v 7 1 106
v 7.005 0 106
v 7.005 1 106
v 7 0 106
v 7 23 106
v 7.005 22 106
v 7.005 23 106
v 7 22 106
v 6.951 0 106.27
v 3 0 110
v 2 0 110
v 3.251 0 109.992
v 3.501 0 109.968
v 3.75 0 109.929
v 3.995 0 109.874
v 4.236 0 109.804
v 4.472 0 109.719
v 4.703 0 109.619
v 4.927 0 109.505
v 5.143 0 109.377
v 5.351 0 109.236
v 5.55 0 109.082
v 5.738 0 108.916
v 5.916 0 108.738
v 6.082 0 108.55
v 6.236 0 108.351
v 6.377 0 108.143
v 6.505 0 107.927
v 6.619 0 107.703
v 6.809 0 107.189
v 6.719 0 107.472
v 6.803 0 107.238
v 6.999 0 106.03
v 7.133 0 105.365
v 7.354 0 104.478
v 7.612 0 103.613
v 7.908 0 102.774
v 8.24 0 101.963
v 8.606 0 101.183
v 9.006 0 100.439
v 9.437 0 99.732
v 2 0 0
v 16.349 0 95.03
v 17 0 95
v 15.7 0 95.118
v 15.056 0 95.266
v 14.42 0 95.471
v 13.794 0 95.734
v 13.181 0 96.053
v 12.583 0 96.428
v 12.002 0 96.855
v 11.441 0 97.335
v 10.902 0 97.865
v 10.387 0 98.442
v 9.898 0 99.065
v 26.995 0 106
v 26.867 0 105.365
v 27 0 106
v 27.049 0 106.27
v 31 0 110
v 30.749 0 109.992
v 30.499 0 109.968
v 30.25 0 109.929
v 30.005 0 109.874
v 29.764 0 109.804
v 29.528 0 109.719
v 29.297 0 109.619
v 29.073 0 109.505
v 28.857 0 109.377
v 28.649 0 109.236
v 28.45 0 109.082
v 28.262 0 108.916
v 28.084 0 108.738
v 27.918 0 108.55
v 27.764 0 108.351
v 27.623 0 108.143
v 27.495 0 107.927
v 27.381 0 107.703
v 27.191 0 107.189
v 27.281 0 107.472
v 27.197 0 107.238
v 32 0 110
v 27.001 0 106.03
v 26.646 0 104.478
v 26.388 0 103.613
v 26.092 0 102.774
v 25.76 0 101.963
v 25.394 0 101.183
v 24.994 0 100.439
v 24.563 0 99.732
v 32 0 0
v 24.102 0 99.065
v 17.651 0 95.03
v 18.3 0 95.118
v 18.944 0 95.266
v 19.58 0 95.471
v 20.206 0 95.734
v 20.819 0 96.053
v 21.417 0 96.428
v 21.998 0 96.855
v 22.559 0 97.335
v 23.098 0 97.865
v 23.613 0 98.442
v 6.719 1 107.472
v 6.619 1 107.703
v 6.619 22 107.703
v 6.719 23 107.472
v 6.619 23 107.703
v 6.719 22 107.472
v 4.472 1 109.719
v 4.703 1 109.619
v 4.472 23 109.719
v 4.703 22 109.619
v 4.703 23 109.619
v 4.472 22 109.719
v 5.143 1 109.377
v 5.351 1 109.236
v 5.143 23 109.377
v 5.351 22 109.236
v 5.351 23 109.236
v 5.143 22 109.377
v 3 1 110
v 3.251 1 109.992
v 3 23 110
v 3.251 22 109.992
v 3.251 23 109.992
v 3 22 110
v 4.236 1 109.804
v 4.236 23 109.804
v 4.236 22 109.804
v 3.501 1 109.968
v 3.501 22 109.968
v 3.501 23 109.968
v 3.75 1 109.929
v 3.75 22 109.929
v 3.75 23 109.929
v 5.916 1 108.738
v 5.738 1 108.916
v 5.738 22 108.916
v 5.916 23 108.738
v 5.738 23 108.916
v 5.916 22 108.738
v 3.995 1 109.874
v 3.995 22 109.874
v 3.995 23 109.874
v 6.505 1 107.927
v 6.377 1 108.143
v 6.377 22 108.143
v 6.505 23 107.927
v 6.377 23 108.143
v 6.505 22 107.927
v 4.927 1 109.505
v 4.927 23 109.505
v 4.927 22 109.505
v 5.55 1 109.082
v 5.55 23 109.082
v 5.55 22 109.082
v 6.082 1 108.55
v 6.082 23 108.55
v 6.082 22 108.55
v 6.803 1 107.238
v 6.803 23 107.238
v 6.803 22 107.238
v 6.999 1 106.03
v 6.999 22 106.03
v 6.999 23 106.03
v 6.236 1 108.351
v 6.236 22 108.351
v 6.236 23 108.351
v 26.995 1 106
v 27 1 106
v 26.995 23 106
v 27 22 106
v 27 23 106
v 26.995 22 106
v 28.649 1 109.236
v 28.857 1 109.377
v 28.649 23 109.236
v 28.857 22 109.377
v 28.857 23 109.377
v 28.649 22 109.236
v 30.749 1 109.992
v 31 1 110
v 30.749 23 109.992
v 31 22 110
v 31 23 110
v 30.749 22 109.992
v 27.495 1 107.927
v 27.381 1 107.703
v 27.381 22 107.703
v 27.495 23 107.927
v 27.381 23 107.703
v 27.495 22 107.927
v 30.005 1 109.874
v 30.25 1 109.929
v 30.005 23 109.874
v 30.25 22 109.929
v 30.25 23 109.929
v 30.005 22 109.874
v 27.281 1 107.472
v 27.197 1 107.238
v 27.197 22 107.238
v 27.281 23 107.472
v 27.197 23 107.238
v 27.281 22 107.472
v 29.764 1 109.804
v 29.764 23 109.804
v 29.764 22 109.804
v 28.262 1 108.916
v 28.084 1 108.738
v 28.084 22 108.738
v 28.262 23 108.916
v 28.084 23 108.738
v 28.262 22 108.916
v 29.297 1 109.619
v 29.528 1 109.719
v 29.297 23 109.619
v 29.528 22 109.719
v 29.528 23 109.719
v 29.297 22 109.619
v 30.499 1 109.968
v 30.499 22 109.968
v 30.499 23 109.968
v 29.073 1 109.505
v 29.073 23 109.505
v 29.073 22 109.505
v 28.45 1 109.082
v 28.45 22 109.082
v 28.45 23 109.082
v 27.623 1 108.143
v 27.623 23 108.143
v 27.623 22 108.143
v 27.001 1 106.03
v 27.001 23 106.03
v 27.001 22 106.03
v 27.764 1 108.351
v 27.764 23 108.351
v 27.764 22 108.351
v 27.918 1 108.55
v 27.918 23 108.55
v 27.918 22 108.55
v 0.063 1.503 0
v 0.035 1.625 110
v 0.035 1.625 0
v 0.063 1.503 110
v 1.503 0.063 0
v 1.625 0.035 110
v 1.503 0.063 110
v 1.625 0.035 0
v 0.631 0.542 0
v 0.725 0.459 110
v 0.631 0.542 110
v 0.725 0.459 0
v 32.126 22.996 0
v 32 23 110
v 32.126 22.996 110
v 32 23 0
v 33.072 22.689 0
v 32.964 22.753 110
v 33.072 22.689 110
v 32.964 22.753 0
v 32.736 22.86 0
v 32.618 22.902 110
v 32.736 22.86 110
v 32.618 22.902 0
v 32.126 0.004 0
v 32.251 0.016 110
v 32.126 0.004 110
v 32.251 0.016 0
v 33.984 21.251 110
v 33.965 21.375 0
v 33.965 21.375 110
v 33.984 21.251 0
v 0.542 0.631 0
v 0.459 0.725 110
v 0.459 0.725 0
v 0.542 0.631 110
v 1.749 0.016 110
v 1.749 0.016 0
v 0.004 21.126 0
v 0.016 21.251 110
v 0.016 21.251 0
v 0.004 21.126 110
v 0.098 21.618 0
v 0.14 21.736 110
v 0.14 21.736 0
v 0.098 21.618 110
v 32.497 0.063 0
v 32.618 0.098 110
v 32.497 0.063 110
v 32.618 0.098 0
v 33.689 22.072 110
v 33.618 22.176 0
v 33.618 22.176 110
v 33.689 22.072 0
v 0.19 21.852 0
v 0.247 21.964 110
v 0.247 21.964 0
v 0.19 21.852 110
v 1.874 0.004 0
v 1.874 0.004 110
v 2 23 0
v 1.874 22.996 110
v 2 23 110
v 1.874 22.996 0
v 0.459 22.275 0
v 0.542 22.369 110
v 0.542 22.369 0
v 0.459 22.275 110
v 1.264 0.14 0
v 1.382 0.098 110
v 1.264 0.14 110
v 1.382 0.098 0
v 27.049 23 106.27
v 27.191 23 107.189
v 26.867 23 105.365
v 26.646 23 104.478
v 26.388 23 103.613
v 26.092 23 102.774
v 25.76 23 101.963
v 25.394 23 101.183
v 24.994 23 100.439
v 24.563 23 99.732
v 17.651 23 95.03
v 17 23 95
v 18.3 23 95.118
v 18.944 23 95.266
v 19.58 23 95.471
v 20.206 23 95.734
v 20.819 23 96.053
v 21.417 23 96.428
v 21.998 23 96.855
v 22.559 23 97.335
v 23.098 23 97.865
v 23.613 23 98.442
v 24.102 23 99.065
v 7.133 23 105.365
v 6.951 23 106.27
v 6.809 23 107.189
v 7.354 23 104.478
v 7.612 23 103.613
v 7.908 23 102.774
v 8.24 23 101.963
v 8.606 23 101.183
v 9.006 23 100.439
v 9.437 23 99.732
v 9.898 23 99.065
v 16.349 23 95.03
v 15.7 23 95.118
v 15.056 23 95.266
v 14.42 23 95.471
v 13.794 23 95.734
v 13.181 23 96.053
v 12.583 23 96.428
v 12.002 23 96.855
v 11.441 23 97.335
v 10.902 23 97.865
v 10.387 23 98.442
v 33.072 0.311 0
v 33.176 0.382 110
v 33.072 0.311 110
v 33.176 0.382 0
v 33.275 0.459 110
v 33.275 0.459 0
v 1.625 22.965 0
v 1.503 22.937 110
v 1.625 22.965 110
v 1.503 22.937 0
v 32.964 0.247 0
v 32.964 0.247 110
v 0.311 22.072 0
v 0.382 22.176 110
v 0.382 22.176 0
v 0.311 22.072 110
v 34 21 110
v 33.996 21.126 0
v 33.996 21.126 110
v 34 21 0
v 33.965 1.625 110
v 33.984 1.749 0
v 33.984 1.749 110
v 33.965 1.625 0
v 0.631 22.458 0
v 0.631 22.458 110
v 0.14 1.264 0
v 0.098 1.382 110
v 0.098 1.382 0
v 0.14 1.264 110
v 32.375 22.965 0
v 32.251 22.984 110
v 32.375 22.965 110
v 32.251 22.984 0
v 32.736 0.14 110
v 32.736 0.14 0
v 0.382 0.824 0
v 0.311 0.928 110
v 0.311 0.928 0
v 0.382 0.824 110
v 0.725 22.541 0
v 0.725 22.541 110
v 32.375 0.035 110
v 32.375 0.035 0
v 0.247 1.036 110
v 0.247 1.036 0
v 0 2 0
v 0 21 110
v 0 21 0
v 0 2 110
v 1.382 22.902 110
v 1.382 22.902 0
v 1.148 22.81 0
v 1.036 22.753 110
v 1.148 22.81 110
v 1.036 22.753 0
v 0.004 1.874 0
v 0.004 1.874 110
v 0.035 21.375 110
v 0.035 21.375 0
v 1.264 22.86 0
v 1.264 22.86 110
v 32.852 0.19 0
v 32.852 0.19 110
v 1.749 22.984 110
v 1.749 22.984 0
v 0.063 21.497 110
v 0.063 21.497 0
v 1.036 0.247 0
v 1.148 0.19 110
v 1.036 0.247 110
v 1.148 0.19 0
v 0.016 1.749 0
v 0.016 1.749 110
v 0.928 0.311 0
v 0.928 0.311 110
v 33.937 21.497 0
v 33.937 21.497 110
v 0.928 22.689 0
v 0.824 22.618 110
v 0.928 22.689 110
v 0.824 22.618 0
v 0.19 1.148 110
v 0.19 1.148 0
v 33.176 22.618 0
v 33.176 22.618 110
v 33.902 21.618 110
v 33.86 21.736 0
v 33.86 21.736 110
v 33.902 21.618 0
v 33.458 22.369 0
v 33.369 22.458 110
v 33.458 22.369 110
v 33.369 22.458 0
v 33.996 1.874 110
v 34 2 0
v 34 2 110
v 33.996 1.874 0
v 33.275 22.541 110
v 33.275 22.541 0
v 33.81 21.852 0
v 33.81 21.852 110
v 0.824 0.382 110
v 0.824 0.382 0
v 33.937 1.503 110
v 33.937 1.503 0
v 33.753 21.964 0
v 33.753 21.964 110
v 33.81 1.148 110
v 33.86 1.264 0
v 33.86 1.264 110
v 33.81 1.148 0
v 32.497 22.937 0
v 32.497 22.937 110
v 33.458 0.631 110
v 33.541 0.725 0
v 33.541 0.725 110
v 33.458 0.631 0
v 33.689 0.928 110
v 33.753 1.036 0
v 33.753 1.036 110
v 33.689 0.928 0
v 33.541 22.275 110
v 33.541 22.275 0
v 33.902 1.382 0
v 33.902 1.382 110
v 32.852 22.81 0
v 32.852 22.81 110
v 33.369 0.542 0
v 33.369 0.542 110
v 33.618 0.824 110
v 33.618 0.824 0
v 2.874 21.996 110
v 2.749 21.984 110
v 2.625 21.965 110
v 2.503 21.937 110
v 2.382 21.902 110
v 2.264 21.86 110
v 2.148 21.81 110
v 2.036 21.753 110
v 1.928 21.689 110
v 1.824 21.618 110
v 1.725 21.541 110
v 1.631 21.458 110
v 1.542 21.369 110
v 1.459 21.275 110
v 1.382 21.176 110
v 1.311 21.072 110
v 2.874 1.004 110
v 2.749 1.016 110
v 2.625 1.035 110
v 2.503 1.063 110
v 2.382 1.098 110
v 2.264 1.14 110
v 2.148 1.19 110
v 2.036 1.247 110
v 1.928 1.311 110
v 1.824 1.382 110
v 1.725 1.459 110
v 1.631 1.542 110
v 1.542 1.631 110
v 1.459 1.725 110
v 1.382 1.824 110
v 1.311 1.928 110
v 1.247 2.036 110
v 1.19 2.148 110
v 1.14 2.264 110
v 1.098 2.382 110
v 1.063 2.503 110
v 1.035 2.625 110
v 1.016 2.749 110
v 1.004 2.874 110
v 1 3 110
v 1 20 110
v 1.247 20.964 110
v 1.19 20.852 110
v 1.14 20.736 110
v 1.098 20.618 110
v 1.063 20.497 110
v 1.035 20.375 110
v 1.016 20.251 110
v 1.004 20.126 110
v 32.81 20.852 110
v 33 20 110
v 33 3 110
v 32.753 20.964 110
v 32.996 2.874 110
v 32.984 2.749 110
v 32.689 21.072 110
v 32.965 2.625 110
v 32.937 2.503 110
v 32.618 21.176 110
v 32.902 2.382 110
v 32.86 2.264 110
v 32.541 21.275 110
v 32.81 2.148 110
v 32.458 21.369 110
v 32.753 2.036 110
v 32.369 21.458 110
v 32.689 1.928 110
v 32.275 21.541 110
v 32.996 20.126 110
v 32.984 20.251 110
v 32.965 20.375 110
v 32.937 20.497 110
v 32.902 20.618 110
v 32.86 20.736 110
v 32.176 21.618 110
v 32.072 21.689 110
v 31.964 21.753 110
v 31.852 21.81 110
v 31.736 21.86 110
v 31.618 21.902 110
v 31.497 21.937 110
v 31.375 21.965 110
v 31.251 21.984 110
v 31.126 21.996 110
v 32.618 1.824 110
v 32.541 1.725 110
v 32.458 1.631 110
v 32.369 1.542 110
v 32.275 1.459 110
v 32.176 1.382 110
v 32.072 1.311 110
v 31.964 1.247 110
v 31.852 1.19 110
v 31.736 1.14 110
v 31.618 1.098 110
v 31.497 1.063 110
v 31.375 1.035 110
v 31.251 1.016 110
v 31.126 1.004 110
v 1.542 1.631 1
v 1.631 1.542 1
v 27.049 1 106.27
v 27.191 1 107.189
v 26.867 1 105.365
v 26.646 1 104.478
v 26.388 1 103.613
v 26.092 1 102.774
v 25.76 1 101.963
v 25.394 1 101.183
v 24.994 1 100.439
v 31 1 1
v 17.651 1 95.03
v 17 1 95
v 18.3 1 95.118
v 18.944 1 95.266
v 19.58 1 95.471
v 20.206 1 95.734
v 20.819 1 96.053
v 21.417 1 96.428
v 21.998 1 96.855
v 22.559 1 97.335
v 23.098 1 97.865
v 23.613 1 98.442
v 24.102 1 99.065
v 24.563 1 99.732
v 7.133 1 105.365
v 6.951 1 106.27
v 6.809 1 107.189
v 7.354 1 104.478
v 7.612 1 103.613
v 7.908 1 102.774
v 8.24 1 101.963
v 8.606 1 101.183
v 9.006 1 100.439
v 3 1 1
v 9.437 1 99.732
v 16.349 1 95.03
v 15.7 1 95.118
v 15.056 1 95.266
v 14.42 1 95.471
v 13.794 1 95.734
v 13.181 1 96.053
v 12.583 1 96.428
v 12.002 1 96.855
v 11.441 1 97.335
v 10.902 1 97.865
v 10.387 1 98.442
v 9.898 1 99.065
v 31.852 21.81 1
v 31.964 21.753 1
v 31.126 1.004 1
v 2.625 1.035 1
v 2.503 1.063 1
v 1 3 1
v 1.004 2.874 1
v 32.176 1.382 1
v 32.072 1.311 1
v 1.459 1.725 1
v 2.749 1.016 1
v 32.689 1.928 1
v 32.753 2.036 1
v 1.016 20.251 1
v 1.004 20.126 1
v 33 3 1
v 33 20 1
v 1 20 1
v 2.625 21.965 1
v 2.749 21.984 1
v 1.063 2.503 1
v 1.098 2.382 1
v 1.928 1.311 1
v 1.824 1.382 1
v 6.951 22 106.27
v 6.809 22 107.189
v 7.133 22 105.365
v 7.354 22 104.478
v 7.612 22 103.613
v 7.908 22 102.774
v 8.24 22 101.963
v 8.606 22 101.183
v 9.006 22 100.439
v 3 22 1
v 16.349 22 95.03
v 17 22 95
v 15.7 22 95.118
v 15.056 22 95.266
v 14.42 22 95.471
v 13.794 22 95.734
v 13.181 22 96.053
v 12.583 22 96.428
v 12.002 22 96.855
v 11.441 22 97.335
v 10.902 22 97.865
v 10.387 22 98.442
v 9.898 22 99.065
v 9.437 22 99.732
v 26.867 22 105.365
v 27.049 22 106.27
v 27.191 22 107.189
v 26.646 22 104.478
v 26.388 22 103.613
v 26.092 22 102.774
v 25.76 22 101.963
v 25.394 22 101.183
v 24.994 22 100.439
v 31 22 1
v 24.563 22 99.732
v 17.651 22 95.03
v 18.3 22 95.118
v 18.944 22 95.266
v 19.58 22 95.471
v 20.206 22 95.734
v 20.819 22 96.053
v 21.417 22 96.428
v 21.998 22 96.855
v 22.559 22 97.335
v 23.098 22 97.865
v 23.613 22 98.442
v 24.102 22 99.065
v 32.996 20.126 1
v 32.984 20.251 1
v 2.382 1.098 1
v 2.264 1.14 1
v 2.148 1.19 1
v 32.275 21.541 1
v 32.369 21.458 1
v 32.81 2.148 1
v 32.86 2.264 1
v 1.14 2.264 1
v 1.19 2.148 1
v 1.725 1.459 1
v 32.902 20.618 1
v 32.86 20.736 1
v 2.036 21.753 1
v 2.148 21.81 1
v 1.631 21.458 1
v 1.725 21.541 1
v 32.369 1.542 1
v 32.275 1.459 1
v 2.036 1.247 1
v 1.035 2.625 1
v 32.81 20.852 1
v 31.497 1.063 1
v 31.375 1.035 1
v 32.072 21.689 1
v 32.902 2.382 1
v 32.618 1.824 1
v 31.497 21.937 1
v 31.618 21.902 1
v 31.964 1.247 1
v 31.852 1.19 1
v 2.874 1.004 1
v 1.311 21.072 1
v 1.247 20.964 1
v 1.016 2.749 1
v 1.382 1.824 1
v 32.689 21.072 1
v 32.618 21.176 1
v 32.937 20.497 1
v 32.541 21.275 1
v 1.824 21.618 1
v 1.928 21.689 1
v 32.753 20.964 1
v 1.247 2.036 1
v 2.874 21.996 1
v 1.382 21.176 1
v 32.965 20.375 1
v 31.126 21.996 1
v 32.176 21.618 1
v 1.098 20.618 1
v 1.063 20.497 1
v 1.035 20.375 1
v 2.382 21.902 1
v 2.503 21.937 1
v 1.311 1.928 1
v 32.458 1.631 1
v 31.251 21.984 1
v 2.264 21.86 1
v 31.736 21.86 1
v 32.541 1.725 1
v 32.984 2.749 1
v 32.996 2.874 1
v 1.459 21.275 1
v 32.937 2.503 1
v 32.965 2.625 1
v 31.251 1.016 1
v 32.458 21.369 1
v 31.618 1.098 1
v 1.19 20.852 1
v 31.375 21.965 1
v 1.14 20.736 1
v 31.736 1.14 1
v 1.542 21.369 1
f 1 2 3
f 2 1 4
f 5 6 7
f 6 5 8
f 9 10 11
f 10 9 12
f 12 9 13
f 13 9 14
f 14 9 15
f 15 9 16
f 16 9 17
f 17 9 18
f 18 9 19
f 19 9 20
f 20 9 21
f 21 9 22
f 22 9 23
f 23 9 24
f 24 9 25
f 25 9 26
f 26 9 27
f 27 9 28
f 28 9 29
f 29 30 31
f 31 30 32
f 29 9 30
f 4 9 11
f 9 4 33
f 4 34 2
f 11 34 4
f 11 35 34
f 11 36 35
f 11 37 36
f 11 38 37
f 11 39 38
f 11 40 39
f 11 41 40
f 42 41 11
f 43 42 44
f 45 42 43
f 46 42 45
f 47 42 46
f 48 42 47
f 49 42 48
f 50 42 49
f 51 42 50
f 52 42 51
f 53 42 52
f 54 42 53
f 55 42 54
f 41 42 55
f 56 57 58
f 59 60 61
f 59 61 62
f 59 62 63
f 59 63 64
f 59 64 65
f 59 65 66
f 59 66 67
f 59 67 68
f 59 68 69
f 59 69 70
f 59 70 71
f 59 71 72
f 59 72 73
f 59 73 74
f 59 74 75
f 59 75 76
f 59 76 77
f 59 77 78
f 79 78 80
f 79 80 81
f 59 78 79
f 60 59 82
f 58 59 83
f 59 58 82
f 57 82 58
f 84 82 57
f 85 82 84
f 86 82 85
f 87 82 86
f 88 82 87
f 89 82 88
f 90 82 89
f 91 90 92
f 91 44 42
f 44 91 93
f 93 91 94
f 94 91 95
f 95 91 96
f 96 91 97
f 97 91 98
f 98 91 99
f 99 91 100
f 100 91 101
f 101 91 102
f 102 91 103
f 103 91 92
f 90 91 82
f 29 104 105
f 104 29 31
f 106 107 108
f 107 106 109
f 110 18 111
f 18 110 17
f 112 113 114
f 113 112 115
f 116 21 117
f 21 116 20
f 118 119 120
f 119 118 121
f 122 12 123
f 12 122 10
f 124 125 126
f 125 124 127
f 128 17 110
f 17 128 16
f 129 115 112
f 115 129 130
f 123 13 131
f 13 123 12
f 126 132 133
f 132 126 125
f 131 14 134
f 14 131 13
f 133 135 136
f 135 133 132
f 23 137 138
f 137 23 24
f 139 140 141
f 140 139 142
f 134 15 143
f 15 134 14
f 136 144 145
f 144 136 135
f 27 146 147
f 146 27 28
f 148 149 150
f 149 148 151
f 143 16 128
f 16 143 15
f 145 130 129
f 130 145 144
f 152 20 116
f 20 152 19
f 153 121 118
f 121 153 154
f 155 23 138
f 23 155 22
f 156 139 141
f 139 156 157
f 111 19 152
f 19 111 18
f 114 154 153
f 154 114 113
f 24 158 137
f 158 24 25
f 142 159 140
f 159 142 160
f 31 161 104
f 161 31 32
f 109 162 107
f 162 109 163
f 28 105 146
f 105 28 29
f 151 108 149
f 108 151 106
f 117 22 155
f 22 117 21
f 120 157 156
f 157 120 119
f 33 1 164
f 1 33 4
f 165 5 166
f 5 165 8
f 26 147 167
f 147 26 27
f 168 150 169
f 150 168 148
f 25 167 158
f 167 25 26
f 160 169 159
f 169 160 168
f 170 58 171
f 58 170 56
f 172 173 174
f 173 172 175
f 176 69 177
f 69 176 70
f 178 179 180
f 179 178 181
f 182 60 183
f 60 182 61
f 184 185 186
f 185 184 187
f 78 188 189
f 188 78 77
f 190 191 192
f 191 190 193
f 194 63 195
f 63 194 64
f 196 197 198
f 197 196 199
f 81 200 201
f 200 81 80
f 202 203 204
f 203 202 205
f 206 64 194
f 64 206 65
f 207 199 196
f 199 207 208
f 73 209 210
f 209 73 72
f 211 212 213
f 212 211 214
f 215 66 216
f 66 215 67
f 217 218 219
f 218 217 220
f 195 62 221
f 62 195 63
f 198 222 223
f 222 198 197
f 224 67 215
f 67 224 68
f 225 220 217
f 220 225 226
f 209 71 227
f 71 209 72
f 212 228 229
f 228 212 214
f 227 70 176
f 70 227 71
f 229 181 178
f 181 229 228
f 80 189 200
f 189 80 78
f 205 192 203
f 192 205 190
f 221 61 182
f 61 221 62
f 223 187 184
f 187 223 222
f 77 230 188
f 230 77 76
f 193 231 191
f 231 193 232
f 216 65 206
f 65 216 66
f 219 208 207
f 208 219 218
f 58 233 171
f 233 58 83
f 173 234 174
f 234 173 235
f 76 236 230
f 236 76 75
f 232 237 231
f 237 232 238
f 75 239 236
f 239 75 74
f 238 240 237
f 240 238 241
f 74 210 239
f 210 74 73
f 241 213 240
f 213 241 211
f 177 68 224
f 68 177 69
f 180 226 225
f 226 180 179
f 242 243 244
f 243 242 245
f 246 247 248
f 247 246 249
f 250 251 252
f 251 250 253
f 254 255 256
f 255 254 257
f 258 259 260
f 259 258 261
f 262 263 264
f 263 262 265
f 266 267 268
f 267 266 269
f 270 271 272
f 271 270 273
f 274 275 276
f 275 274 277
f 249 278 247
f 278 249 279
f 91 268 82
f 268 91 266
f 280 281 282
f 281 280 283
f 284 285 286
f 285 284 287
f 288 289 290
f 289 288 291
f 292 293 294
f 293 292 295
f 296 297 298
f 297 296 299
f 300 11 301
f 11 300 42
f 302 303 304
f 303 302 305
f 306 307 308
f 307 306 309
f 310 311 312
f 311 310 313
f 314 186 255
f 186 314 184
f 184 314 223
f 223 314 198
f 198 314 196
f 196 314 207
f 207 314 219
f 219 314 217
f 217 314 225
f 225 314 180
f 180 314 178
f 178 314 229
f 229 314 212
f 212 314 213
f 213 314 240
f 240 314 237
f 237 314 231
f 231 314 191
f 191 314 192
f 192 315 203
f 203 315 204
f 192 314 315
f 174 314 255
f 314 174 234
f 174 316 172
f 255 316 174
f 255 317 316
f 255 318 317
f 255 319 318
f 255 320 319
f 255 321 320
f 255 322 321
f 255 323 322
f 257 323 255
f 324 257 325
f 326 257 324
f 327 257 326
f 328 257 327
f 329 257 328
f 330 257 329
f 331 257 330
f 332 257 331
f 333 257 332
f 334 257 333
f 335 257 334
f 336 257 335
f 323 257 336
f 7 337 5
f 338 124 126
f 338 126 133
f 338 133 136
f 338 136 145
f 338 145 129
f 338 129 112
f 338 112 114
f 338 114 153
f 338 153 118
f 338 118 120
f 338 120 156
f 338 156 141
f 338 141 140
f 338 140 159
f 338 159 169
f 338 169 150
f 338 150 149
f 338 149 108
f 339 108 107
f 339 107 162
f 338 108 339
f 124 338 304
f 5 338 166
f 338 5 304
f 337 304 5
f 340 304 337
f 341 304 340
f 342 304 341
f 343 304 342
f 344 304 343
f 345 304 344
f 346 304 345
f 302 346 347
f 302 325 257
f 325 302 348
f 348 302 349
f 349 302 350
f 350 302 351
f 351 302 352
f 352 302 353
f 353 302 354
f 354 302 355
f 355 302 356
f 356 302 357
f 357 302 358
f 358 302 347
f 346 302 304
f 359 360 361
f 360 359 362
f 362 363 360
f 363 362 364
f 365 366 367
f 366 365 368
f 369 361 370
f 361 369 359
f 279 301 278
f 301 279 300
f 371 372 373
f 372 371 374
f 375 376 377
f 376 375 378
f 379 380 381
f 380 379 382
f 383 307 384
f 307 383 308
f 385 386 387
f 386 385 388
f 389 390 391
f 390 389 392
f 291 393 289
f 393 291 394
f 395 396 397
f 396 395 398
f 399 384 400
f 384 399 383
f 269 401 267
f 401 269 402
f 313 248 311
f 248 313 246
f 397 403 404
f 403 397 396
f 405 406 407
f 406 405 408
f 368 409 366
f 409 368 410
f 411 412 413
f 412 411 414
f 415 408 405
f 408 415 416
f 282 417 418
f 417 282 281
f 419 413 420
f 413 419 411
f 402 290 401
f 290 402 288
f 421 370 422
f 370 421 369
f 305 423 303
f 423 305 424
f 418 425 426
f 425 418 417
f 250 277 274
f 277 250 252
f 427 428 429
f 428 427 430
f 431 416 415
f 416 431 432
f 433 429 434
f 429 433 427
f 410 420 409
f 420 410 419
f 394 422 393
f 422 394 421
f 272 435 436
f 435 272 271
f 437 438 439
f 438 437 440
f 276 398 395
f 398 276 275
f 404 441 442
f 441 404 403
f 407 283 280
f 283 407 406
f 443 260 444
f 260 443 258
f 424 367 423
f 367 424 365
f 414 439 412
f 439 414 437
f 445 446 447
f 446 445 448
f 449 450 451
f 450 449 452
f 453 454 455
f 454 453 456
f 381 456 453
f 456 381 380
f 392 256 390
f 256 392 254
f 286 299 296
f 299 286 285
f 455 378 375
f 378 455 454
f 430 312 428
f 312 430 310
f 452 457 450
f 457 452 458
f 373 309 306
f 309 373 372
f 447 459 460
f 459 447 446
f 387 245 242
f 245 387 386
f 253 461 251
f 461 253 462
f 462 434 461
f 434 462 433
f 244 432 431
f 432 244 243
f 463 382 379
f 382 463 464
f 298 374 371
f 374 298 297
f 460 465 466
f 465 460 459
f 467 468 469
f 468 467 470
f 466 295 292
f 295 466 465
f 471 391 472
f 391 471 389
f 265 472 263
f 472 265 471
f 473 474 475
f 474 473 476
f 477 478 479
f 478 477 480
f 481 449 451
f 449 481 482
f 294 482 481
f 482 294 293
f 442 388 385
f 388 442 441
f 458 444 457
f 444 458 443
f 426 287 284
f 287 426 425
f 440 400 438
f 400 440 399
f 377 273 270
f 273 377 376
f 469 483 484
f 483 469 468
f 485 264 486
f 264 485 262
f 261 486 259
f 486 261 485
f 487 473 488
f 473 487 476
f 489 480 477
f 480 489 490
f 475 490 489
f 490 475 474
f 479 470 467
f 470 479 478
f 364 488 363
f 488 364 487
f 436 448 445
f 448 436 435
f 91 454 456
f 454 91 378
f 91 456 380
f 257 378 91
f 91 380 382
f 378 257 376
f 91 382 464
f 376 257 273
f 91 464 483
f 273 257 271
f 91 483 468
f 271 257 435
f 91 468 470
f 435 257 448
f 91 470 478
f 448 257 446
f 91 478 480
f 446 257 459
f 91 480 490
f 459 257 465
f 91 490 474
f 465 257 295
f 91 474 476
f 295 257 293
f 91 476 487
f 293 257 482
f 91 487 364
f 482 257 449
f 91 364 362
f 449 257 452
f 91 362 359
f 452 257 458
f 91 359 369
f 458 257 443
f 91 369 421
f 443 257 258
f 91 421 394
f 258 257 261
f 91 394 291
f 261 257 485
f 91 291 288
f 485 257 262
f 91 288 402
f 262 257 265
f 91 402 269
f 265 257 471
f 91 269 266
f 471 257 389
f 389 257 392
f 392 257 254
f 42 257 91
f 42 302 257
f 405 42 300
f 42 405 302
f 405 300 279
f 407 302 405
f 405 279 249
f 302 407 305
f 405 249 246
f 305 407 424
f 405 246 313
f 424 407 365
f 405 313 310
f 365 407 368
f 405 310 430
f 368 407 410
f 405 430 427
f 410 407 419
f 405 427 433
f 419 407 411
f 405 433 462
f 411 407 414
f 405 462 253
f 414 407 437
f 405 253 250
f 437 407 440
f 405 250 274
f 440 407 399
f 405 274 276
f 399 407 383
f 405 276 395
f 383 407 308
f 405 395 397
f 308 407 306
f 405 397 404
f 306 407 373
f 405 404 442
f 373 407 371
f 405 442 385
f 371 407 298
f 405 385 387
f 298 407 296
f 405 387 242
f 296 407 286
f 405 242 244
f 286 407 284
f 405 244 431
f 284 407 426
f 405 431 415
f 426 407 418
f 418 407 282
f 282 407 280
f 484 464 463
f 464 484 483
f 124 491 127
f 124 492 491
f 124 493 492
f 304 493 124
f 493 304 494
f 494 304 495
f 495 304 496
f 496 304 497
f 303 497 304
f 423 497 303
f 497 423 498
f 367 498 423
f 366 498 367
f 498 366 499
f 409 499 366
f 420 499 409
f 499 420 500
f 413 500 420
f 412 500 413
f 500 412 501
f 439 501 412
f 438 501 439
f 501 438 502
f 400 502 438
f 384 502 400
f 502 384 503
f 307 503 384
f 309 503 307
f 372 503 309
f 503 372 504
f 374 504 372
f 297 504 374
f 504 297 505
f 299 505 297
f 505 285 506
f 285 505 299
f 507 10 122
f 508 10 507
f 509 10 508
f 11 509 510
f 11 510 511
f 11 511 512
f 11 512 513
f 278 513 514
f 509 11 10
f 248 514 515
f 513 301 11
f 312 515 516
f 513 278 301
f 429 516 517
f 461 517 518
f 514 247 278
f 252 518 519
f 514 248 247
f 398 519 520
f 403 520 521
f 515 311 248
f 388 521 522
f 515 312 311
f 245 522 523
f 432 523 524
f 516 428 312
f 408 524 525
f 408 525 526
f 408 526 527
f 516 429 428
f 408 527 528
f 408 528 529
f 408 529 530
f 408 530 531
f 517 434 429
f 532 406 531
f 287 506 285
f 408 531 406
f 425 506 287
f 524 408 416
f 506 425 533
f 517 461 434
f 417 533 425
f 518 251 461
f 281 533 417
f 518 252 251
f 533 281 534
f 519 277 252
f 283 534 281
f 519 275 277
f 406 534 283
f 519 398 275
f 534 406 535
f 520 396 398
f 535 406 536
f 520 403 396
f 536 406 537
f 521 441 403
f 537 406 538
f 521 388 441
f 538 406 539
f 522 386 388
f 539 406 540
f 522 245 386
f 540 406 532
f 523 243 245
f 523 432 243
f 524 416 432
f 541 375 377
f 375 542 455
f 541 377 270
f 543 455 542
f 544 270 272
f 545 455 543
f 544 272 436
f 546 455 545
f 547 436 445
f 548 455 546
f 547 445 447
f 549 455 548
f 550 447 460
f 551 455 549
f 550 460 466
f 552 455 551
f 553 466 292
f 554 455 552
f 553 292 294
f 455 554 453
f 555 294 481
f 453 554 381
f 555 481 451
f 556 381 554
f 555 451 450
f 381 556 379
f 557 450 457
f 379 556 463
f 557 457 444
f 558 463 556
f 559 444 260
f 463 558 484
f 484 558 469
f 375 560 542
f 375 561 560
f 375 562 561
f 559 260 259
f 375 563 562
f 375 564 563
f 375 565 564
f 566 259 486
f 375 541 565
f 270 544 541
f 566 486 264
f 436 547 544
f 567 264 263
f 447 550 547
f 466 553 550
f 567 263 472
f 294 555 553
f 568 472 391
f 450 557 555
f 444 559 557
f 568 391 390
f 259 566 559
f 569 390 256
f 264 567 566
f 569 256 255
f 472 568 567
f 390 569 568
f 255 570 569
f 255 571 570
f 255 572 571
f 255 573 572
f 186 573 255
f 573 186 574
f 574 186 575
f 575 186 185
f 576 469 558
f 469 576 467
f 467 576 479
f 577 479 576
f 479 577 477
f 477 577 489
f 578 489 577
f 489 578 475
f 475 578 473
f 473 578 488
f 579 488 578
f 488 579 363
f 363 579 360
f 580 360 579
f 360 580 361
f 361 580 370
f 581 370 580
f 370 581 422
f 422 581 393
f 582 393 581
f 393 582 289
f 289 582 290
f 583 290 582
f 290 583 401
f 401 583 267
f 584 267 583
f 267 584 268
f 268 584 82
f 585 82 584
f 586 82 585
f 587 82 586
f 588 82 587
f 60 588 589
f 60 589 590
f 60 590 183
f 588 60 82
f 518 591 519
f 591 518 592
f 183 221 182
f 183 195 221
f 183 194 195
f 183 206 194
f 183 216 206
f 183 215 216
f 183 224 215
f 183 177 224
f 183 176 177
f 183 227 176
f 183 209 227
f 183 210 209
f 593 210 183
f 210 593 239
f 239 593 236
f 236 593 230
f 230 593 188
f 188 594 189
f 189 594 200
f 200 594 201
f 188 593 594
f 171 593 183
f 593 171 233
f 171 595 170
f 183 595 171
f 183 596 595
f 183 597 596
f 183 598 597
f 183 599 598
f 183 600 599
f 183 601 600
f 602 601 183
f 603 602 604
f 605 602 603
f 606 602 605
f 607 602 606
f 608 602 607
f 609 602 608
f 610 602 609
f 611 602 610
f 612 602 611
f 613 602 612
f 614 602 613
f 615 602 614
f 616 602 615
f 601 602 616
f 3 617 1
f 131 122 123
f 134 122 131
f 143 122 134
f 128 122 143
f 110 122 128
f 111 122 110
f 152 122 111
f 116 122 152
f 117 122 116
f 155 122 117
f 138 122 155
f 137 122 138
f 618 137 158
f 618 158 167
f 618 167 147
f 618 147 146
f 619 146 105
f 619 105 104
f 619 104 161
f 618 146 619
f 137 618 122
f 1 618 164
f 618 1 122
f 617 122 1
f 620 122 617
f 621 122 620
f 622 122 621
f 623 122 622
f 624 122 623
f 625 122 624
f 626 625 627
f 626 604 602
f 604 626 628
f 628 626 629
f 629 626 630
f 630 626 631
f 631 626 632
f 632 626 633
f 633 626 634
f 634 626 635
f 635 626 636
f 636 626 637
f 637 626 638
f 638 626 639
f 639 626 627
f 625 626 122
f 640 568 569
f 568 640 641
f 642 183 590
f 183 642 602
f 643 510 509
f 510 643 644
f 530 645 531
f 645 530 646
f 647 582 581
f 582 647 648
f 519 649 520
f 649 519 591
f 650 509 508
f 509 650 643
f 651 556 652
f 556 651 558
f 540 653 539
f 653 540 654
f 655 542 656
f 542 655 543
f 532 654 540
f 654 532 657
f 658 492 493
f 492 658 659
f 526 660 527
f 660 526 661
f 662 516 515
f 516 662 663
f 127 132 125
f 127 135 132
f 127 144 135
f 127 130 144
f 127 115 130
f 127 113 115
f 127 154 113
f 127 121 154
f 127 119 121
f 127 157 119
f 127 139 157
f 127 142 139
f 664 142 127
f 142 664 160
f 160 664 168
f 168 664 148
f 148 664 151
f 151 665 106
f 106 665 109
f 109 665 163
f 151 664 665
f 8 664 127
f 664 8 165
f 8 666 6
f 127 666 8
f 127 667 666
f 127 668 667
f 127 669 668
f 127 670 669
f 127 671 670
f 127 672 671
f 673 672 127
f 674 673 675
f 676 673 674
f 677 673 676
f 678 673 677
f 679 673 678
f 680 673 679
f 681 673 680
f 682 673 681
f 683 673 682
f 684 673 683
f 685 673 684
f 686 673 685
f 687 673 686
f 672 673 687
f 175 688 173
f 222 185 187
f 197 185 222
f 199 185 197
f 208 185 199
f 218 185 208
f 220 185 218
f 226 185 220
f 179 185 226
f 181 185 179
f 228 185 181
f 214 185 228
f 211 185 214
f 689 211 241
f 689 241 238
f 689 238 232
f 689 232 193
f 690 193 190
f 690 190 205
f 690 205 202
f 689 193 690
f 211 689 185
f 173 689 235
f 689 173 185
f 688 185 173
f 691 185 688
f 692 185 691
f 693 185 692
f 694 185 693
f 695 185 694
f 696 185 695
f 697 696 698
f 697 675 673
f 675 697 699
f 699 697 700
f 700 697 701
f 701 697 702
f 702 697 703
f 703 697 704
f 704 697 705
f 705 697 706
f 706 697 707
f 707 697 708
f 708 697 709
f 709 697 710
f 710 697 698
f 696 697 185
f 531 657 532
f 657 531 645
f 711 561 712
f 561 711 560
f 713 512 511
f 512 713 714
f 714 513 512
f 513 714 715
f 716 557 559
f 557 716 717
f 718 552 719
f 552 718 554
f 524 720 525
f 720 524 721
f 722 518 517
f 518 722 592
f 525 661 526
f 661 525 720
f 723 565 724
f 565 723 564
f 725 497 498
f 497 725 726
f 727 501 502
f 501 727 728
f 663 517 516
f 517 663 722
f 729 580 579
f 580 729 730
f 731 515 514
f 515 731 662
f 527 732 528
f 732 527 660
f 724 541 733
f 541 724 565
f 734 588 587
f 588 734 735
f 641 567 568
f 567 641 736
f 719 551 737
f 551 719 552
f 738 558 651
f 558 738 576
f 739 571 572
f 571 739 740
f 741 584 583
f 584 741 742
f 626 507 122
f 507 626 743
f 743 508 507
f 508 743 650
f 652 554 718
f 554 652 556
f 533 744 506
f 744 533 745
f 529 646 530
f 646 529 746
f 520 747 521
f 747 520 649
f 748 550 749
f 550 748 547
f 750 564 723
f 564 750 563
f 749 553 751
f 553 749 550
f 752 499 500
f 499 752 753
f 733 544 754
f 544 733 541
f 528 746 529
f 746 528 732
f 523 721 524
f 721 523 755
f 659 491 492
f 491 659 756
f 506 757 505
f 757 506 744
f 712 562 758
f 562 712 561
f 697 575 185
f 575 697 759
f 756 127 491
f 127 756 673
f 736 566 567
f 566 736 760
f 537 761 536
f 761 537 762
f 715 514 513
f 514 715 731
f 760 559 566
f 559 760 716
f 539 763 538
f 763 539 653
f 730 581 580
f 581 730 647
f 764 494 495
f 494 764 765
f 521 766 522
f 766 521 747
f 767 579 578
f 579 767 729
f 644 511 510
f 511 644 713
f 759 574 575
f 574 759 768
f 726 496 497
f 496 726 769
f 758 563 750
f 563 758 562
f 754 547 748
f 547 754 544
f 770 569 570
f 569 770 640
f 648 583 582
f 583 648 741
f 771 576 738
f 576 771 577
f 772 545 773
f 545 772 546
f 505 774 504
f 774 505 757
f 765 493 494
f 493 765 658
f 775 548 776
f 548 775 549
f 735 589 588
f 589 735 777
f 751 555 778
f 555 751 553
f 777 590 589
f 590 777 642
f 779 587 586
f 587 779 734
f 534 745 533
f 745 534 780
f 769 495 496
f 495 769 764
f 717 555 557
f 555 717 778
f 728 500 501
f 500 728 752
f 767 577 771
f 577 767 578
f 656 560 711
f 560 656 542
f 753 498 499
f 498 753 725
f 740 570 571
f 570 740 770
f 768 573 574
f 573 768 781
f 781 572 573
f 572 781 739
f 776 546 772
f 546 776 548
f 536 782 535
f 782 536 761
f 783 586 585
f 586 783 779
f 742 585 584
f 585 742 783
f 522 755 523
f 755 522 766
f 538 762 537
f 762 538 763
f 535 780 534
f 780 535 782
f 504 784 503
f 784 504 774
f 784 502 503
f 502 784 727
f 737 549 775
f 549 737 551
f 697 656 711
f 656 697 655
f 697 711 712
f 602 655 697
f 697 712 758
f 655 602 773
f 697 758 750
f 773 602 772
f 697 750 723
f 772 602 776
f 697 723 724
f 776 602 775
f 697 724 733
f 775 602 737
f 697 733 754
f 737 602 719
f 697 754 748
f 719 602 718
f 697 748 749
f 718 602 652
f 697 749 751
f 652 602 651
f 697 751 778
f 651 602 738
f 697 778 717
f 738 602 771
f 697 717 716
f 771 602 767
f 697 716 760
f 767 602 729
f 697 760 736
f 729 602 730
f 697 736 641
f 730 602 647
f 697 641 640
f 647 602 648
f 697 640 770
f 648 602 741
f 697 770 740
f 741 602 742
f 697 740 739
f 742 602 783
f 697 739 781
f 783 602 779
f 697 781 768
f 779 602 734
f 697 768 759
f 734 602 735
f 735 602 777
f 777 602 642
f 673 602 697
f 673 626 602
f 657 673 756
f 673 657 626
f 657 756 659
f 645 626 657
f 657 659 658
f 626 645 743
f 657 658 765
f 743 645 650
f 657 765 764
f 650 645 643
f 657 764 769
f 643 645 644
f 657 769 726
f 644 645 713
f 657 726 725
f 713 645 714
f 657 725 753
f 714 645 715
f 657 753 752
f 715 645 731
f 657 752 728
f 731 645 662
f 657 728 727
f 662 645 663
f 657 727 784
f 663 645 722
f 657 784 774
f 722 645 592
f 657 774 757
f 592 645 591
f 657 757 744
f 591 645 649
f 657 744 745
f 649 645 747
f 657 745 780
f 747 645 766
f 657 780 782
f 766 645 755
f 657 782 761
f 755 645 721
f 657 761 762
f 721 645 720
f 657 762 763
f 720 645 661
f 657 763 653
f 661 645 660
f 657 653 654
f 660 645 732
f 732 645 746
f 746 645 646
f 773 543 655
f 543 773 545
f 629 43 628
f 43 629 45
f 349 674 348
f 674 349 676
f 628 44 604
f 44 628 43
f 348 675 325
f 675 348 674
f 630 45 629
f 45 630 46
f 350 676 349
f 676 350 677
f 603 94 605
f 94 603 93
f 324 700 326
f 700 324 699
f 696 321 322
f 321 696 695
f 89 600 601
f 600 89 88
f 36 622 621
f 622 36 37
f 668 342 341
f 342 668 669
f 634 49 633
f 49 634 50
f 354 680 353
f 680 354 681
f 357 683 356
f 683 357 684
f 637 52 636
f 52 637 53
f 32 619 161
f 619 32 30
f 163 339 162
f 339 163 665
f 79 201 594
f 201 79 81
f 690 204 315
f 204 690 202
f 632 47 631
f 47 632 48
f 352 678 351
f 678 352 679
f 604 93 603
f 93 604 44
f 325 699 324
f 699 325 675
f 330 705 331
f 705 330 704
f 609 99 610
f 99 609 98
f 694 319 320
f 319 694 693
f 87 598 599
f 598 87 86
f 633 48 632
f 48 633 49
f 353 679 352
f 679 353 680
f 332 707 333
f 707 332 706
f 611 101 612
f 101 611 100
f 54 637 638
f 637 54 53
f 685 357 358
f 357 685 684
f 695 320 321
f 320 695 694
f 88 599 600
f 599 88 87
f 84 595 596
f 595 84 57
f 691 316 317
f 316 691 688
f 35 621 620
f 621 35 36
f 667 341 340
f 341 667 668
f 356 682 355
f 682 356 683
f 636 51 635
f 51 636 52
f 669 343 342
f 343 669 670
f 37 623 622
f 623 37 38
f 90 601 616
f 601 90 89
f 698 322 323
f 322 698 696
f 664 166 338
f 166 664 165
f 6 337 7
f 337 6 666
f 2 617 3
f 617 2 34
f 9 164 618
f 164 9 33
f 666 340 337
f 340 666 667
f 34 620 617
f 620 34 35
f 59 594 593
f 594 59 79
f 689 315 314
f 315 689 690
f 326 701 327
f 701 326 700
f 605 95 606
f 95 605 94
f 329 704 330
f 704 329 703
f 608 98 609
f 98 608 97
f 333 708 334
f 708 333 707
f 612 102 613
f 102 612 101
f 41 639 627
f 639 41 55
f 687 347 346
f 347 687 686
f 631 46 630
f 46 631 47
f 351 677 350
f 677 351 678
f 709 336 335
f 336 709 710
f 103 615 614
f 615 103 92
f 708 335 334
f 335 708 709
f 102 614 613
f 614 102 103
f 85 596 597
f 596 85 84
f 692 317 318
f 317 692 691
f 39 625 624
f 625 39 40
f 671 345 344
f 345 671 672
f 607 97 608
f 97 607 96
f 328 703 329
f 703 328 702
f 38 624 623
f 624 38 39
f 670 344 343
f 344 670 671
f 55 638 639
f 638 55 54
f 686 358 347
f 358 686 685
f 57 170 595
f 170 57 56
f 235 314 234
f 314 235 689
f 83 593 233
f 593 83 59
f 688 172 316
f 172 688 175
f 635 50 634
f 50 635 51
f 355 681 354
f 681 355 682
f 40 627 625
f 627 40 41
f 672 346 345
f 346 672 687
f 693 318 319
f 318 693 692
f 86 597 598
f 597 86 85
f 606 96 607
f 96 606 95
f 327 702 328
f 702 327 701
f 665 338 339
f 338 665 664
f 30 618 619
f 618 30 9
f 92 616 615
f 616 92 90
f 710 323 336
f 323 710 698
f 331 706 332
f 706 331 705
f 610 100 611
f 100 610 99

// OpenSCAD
//
// ktRACK88
//
//

gap1 = 0.001;
gap2 = 0.003;
th = 2;



tube();



module tube()
{
difference()
{
    union()
    {
        BR = 2;
        $fn=100;
        minkowski()
        {
            translate([BR, BR, 0]) cube([(32+1*2)-BR*2, (21+1*2)-BR*2, 110-1]);
            cylinder(r=BR, h=1);
        }
    }
    
    BR = 2;
    $fn=100;
    translate([1, 1, 1])
    minkowski()
    {
        translate([BR, BR, 0]) cube([(32)-BR*2, (21)-BR*2, 110-1]);
        cylinder(r=BR, h=1);
    }
    
    translate([(32+1*2)/2, 0, 110]) resize([20.75, (21+1*2), 30]) rotate([0, 90, 90]) cylinder(h=1, r=1, $fn=100);
    
    #translate([(32+1*2)/2-5-9, 0, 110-4]) kado();
    #translate([(32+1*2)/2+4, 0, 110-4]) kado();
}
}
module kado()
{
difference()
{
    union()
    {
        translate([0, 0, 0]) cube([10, 50, 10]);
    }
    translate([0, 0, 0]) rotate([0, 90, 90]) cylinder(h=50, r=4, $fn=100);
    translate([10, 0, 0]) rotate([0, 90, 90]) cylinder(h=50, r=4, $fn=100);
}
}

module case2()
{
difference()
{
    union()
    {
        BR = 2;
        $fn=100;
        minkowski()
        {
            translate([BR, BR, 0]) cube([(60+1*2)-BR*2, (15+1*2)-BR*2, 105-1]);
            cylinder(r=BR, h=1);
        }
    }
    
    BR = 2;
    $fn=100;
    translate([1, 1, 1])
    minkowski()
    {
        translate([BR, BR, 0]) cube([(60)-BR*2, (15)-BR*2, 105-1]);
        cylinder(r=BR, h=1);
    }
    
    translate([(60+1*2)/2, 0, 105]) resize([20.75, (22+1*2), 30]) rotate([0, 90, 90]) cylinder(h=1, r=1, $fn=100);
    
    #translate([(60+1*2)/2-5-9, 0, 105-4]) kado();
    #translate([(60+1*2)/2+4, 0, 105-4]) kado();
}
}
module case()
{
difference()
{
    union()
    {
        BR = 5;
        $fn=100;
        minkowski()
        {
            translate([BR, BR, 0]) cube([(110+4*2)-BR*2, (63+5+6.5+1*2)-BR*2, 10-1]);
            cylinder(r=BR, h=1);
        }
    }
    translate([4, 5, 2]) cube([110, 63, 20]);
    
    translate([0, 2.5, 10/2+5/2]) rotate([0, 90, 0]) cylinder(h=130, r=3.5/2, $fn=100);
    translate([(110+4*2)/2-(25+2)/2, 0-gap1, 10/2]) cube([(25+2), 5+gap2, 20/2+gap1]);

    translate([(110+4*2)/2-6.5/2, (63+5+6.5+1*2)-20-2, 10-3.5-1]) cube([6.5, 20, 3.5]);
}
    #translate([40, 2.5, 10/2+5/2]) wa();
}
module huta()
{
difference()
{
    union()
    {
        BR = 5;
        $fn=100;
        translate([0, 0, 10+0.5])
        minkowski()
        {
            translate([BR, BR, 0]) cube([(110+4*2)-BR*2, (63+5+6.5+1*2)-BR*2, 10-1]);
            cylinder(r=BR, h=1);
        }
        translate([(110+4*2)/2-25/2, 0-gap1, 10/2+5/2]) cube([25, 5+gap2, 10/2+gap1]);
        translate([(110+4*2)/2-25/2, 5/2, 10/2+5/2]) rotate([0, 90, 0]) cylinder(h=25, r=5/2, $fn=100);
    }
    translate([4, 5, 10]) cube([110, 63, 10-2]);
    
    translate([0, 2.5, 10/2+5/2]) rotate([0, 90, 0]) cylinder(h=130, r=3.5/2, $fn=100);
    #translate([(110+4*2)/2-6.5/2, (63+5+6.5+1*2)-20-2, 10+1]) cube([6.5, 20, 3.5]);
}
}
module wa()
{
difference()
{
    union()
    {
        translate([0, 0, 0]) rotate([0, 90, 0]) cylinder(h=1, r=5/2, $fn=100);
    }
    translate([0-gap1, 0, 0]) rotate([0, 90, 0]) cylinder(h=1+gap2, r=2/2, $fn=100);
}
}

module hasami()
{
difference()
{
    union()
    {
        translate([-10/2, 0, 0]) cube([10, 67, 67]);
    }
    #translate([6/2, 0, 2]) rotate([45, 0, 180]) cube([6, 15, 95+30]);

}
}


module bottle()
{
difference()
{
    union()
    {
        BR = 5;
        $fn=100;
        translate([-50/2, -70/2+15, -1])
        minkowski()
        {
            translate([BR, BR, 0]) cube([50-BR*2, 70-BR*2, 30+1]);
            cylinder(r=BR, h=1);
        }
    }
    #translate([0, 0, 9]) rotate([-25, 0, 0]) rotate([0, 0, 90]) cylinder(h=100, r1=41/2, r2=41/2, $fn=100);

}
}


module hook()
{
difference()
{
    union()
    {
        translate([0, 0, 9.5+3]) scale([1, 0.6, 1]) rotate([0, 0, 90]) cylinder(h=0.5, r1=60/2, r2=60/2, $fn=100);
        translate([0, 0, 9.5]) scale([1, 0.6, 1]) rotate([0, 0, 90]) cylinder(h=3, r1=40/2, r2=60/2, $fn=100);
        translate([0, 0, 0]) scale([1, 0.6, 1]) rotate([0, 180, 90]) cylinder(h=3, r1=40/2, r2=60/2, $fn=100);
        translate([0, 0, 0-3]) scale([1, 0.6, 1]) rotate([0, 180, 90]) cylinder(h=0.5, r1=60/2, r2=60/2, $fn=100);
    }
    translate([-500/2, 0, -500/2]) cube([500, 500, 500]);
}
difference()
{
    union()
    {
        translate([0, 0, -3]) scale([1, 0.6, 1]) rotate([0, 0, 90]) cylinder(h=3+9.5+3, r1=60/2, r2=60/2, $fn=100);
    }
    translate([-500/2, 0, -500/2]) cube([500, 500, 500]);
    translate([-500/2, -500-5, -500/2]) cube([500, 500, 500]);
}
}

module stand()
{
difference()
{
    union()
    {
        BR = 5;
        $fn=100;
        translate([-50/2, -60/2+10, -1])
        minkowski()
        {
            translate([BR, BR, 0]) cube([50-BR*2, 60-BR*2, 30+1]);
            cylinder(r=BR, h=1);
        }
        translate([-30/2, -60/2+10+100-10/2, 65]) rotate([0, 90, 0]) cylinder(h=30, r=10/2, $fn=100);
        translate([-30/2, -60/2+10+100-10/2+2.4, 65+4.4]) rotate([-90-75, 0, 0]) cube([30, 100, 100]);
    }
    translate([0, 0, 9]) rotate([-25, 0, 0]) rotate([0, 0, 90]) cylinder(h=100, r1=41/2, r2=41/2, $fn=100);

    translate([-500/2, -500/2, -500]) cube([500, 5000, 500]);
    translate([100/2, 40, 6]) rotate([26.5, 0, 180]) cube([100, 100, 100]);

    
    translate([100/2, 40-5+0.5, 6]) rotate([26.5, 0, 180]) cube([100, 100, 60]);
    translate([-100/2, 40-5+0.5, 6]) cube([100, 4.5, 60]);

    translate([-100/2, -25, 31]) cube([100, 20, 4.5]);
}
}


module stand2()
{
    translate([0, 0, 0]) stand();
    translate([0, 107.5, 0]) stand();
}
